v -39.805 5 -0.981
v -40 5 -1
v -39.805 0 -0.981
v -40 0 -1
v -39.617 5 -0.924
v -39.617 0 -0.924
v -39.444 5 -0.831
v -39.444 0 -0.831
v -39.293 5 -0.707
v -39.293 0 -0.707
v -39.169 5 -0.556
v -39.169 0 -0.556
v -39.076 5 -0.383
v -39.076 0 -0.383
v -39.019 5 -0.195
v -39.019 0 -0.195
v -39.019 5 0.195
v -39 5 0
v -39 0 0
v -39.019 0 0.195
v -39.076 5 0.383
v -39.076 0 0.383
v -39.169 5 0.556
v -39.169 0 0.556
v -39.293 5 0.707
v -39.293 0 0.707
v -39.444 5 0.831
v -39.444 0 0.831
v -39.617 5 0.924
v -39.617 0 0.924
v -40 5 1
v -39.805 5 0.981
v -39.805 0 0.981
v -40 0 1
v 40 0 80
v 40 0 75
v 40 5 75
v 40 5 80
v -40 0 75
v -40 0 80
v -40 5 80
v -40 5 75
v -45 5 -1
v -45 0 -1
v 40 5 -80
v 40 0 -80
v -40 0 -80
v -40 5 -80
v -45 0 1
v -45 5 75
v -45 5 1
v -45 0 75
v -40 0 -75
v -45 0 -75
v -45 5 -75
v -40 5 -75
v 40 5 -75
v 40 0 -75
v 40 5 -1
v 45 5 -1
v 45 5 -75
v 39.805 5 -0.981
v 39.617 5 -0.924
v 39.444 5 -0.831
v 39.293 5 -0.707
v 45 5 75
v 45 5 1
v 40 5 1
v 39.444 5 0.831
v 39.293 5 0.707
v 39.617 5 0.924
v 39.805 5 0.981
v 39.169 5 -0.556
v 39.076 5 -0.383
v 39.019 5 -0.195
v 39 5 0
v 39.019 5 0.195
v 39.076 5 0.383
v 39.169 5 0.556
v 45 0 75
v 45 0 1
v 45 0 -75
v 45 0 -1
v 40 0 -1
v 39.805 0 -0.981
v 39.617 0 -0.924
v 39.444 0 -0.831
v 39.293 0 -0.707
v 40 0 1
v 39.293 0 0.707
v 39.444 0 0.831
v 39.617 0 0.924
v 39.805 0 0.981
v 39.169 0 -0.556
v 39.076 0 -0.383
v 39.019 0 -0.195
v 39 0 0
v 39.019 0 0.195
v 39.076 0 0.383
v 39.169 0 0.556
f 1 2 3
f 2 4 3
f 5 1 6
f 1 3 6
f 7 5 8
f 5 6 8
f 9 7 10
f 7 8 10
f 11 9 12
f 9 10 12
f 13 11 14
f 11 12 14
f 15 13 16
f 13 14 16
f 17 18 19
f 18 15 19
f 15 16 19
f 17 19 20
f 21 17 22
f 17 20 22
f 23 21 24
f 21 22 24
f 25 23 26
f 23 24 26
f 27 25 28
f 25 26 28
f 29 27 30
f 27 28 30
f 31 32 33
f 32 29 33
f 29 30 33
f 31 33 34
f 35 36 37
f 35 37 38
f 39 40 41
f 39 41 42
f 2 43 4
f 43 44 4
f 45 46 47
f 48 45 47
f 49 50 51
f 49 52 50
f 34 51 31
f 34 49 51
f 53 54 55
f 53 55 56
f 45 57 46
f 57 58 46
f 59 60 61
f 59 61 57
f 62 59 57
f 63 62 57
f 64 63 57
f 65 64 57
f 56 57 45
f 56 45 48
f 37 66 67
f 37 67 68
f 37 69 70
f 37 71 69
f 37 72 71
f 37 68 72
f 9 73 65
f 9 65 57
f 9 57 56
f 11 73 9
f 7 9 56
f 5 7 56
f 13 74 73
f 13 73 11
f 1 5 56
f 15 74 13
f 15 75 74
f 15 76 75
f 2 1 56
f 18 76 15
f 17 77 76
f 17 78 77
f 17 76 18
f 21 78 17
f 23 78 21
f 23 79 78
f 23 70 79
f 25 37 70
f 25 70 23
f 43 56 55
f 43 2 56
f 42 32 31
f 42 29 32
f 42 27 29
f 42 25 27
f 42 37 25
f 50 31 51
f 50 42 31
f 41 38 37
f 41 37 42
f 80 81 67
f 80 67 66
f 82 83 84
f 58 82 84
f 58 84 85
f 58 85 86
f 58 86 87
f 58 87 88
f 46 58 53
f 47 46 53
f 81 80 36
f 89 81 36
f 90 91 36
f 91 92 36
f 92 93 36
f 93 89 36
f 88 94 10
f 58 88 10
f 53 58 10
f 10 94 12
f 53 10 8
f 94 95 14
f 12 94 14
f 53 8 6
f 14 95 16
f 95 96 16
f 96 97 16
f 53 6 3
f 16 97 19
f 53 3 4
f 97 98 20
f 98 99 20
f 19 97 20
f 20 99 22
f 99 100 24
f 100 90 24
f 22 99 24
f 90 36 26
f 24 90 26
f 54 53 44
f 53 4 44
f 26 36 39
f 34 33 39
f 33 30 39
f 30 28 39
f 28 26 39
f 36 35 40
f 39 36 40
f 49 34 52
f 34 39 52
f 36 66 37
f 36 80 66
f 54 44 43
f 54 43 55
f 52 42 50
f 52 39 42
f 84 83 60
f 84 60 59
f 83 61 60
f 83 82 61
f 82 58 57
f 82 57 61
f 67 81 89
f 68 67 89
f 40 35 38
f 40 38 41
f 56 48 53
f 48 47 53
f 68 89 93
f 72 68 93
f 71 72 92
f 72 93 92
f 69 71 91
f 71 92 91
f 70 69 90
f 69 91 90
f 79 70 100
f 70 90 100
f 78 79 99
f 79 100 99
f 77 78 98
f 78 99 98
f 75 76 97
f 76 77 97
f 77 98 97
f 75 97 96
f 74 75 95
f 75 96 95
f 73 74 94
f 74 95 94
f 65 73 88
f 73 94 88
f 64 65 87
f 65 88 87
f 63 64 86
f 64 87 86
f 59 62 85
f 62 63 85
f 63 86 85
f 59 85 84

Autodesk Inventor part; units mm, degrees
ref_plane "YZ Plane" through (0, 0, 0) normal (1, 0, 0) x (0, 1, 0)
ref_plane "XZ Plane" through (0, 0, 0) normal (0, 1, 0) x (-1, 0, 0)
ref_plane "XY Plane" through (0, 0, 0) normal (0, 0, 1) x (1, 0, 0)
sketch "Skizze1" plane through (0, 0, 0) normal (0, 1, 0) x (-1, 0, 0)
  line L0 (45, -75) -> (-45, -75)
  line L1 (-45, -75) -> (-45, 75)
  line L2 (-45, 75) -> (45, 75)
  line L3 (45, 75) -> (45, -75)
  line L4 (45, -75) -> (-45, 75) construction
  line L5 (45, 75) -> (-45, -75) construction
  line L6 (40, -75) -> (-40, -75)
  line L7 (-40, -75) -> (-40, -80)
  line L8 (-40, -80) -> (40, -80)
  line L9 (40, -80) -> (40, -75)
  line L10 (40, 75) -> (-40, 75)
  line L11 (-40, 75) -> (-40, 80)
  line L12 (-40, 80) -> (40, 80)
  line L13 (40, 80) -> (40, 75)
  line L14 (45, -1) -> (40, -1)
  line L15 (45, 1) -> (40, 1)
  line L16 (-45, -1) -> (-40, -1)
  line L17 (-45, 1) -> (-40, 1)
  arc A0 (40, 1) -> (40, -1) centre (40, 0) ccw
  arc A1 (-40, -1) -> (-40, 1) centre (-40, 0) ccw
  point P0 (0, 0)
  point P1 (0, 0)
  point P2 (40, -77.5)
  point P3 (0, 0)
  dimension "d0" = 150
  dimension "d1" = 5
  dimension "d2" = 5
  dimension "d3" = 5
  dimension "d4" = 80
  dimension "d5" = 2
  dimension "d6" = 5
  dimension "d7" = 1
extrude "Extrusion1" add sketch "Skizze1" along normal blind 5 contours L0 L1 L16 A1 L17 L2 L3 L15 A0 L14 | L9 L8 L7 L0 | L2 L11 L12 L13
equation "\"d4\" = t"
equation "\"t\" = 80"
properties part number "Verbinder_t80"
